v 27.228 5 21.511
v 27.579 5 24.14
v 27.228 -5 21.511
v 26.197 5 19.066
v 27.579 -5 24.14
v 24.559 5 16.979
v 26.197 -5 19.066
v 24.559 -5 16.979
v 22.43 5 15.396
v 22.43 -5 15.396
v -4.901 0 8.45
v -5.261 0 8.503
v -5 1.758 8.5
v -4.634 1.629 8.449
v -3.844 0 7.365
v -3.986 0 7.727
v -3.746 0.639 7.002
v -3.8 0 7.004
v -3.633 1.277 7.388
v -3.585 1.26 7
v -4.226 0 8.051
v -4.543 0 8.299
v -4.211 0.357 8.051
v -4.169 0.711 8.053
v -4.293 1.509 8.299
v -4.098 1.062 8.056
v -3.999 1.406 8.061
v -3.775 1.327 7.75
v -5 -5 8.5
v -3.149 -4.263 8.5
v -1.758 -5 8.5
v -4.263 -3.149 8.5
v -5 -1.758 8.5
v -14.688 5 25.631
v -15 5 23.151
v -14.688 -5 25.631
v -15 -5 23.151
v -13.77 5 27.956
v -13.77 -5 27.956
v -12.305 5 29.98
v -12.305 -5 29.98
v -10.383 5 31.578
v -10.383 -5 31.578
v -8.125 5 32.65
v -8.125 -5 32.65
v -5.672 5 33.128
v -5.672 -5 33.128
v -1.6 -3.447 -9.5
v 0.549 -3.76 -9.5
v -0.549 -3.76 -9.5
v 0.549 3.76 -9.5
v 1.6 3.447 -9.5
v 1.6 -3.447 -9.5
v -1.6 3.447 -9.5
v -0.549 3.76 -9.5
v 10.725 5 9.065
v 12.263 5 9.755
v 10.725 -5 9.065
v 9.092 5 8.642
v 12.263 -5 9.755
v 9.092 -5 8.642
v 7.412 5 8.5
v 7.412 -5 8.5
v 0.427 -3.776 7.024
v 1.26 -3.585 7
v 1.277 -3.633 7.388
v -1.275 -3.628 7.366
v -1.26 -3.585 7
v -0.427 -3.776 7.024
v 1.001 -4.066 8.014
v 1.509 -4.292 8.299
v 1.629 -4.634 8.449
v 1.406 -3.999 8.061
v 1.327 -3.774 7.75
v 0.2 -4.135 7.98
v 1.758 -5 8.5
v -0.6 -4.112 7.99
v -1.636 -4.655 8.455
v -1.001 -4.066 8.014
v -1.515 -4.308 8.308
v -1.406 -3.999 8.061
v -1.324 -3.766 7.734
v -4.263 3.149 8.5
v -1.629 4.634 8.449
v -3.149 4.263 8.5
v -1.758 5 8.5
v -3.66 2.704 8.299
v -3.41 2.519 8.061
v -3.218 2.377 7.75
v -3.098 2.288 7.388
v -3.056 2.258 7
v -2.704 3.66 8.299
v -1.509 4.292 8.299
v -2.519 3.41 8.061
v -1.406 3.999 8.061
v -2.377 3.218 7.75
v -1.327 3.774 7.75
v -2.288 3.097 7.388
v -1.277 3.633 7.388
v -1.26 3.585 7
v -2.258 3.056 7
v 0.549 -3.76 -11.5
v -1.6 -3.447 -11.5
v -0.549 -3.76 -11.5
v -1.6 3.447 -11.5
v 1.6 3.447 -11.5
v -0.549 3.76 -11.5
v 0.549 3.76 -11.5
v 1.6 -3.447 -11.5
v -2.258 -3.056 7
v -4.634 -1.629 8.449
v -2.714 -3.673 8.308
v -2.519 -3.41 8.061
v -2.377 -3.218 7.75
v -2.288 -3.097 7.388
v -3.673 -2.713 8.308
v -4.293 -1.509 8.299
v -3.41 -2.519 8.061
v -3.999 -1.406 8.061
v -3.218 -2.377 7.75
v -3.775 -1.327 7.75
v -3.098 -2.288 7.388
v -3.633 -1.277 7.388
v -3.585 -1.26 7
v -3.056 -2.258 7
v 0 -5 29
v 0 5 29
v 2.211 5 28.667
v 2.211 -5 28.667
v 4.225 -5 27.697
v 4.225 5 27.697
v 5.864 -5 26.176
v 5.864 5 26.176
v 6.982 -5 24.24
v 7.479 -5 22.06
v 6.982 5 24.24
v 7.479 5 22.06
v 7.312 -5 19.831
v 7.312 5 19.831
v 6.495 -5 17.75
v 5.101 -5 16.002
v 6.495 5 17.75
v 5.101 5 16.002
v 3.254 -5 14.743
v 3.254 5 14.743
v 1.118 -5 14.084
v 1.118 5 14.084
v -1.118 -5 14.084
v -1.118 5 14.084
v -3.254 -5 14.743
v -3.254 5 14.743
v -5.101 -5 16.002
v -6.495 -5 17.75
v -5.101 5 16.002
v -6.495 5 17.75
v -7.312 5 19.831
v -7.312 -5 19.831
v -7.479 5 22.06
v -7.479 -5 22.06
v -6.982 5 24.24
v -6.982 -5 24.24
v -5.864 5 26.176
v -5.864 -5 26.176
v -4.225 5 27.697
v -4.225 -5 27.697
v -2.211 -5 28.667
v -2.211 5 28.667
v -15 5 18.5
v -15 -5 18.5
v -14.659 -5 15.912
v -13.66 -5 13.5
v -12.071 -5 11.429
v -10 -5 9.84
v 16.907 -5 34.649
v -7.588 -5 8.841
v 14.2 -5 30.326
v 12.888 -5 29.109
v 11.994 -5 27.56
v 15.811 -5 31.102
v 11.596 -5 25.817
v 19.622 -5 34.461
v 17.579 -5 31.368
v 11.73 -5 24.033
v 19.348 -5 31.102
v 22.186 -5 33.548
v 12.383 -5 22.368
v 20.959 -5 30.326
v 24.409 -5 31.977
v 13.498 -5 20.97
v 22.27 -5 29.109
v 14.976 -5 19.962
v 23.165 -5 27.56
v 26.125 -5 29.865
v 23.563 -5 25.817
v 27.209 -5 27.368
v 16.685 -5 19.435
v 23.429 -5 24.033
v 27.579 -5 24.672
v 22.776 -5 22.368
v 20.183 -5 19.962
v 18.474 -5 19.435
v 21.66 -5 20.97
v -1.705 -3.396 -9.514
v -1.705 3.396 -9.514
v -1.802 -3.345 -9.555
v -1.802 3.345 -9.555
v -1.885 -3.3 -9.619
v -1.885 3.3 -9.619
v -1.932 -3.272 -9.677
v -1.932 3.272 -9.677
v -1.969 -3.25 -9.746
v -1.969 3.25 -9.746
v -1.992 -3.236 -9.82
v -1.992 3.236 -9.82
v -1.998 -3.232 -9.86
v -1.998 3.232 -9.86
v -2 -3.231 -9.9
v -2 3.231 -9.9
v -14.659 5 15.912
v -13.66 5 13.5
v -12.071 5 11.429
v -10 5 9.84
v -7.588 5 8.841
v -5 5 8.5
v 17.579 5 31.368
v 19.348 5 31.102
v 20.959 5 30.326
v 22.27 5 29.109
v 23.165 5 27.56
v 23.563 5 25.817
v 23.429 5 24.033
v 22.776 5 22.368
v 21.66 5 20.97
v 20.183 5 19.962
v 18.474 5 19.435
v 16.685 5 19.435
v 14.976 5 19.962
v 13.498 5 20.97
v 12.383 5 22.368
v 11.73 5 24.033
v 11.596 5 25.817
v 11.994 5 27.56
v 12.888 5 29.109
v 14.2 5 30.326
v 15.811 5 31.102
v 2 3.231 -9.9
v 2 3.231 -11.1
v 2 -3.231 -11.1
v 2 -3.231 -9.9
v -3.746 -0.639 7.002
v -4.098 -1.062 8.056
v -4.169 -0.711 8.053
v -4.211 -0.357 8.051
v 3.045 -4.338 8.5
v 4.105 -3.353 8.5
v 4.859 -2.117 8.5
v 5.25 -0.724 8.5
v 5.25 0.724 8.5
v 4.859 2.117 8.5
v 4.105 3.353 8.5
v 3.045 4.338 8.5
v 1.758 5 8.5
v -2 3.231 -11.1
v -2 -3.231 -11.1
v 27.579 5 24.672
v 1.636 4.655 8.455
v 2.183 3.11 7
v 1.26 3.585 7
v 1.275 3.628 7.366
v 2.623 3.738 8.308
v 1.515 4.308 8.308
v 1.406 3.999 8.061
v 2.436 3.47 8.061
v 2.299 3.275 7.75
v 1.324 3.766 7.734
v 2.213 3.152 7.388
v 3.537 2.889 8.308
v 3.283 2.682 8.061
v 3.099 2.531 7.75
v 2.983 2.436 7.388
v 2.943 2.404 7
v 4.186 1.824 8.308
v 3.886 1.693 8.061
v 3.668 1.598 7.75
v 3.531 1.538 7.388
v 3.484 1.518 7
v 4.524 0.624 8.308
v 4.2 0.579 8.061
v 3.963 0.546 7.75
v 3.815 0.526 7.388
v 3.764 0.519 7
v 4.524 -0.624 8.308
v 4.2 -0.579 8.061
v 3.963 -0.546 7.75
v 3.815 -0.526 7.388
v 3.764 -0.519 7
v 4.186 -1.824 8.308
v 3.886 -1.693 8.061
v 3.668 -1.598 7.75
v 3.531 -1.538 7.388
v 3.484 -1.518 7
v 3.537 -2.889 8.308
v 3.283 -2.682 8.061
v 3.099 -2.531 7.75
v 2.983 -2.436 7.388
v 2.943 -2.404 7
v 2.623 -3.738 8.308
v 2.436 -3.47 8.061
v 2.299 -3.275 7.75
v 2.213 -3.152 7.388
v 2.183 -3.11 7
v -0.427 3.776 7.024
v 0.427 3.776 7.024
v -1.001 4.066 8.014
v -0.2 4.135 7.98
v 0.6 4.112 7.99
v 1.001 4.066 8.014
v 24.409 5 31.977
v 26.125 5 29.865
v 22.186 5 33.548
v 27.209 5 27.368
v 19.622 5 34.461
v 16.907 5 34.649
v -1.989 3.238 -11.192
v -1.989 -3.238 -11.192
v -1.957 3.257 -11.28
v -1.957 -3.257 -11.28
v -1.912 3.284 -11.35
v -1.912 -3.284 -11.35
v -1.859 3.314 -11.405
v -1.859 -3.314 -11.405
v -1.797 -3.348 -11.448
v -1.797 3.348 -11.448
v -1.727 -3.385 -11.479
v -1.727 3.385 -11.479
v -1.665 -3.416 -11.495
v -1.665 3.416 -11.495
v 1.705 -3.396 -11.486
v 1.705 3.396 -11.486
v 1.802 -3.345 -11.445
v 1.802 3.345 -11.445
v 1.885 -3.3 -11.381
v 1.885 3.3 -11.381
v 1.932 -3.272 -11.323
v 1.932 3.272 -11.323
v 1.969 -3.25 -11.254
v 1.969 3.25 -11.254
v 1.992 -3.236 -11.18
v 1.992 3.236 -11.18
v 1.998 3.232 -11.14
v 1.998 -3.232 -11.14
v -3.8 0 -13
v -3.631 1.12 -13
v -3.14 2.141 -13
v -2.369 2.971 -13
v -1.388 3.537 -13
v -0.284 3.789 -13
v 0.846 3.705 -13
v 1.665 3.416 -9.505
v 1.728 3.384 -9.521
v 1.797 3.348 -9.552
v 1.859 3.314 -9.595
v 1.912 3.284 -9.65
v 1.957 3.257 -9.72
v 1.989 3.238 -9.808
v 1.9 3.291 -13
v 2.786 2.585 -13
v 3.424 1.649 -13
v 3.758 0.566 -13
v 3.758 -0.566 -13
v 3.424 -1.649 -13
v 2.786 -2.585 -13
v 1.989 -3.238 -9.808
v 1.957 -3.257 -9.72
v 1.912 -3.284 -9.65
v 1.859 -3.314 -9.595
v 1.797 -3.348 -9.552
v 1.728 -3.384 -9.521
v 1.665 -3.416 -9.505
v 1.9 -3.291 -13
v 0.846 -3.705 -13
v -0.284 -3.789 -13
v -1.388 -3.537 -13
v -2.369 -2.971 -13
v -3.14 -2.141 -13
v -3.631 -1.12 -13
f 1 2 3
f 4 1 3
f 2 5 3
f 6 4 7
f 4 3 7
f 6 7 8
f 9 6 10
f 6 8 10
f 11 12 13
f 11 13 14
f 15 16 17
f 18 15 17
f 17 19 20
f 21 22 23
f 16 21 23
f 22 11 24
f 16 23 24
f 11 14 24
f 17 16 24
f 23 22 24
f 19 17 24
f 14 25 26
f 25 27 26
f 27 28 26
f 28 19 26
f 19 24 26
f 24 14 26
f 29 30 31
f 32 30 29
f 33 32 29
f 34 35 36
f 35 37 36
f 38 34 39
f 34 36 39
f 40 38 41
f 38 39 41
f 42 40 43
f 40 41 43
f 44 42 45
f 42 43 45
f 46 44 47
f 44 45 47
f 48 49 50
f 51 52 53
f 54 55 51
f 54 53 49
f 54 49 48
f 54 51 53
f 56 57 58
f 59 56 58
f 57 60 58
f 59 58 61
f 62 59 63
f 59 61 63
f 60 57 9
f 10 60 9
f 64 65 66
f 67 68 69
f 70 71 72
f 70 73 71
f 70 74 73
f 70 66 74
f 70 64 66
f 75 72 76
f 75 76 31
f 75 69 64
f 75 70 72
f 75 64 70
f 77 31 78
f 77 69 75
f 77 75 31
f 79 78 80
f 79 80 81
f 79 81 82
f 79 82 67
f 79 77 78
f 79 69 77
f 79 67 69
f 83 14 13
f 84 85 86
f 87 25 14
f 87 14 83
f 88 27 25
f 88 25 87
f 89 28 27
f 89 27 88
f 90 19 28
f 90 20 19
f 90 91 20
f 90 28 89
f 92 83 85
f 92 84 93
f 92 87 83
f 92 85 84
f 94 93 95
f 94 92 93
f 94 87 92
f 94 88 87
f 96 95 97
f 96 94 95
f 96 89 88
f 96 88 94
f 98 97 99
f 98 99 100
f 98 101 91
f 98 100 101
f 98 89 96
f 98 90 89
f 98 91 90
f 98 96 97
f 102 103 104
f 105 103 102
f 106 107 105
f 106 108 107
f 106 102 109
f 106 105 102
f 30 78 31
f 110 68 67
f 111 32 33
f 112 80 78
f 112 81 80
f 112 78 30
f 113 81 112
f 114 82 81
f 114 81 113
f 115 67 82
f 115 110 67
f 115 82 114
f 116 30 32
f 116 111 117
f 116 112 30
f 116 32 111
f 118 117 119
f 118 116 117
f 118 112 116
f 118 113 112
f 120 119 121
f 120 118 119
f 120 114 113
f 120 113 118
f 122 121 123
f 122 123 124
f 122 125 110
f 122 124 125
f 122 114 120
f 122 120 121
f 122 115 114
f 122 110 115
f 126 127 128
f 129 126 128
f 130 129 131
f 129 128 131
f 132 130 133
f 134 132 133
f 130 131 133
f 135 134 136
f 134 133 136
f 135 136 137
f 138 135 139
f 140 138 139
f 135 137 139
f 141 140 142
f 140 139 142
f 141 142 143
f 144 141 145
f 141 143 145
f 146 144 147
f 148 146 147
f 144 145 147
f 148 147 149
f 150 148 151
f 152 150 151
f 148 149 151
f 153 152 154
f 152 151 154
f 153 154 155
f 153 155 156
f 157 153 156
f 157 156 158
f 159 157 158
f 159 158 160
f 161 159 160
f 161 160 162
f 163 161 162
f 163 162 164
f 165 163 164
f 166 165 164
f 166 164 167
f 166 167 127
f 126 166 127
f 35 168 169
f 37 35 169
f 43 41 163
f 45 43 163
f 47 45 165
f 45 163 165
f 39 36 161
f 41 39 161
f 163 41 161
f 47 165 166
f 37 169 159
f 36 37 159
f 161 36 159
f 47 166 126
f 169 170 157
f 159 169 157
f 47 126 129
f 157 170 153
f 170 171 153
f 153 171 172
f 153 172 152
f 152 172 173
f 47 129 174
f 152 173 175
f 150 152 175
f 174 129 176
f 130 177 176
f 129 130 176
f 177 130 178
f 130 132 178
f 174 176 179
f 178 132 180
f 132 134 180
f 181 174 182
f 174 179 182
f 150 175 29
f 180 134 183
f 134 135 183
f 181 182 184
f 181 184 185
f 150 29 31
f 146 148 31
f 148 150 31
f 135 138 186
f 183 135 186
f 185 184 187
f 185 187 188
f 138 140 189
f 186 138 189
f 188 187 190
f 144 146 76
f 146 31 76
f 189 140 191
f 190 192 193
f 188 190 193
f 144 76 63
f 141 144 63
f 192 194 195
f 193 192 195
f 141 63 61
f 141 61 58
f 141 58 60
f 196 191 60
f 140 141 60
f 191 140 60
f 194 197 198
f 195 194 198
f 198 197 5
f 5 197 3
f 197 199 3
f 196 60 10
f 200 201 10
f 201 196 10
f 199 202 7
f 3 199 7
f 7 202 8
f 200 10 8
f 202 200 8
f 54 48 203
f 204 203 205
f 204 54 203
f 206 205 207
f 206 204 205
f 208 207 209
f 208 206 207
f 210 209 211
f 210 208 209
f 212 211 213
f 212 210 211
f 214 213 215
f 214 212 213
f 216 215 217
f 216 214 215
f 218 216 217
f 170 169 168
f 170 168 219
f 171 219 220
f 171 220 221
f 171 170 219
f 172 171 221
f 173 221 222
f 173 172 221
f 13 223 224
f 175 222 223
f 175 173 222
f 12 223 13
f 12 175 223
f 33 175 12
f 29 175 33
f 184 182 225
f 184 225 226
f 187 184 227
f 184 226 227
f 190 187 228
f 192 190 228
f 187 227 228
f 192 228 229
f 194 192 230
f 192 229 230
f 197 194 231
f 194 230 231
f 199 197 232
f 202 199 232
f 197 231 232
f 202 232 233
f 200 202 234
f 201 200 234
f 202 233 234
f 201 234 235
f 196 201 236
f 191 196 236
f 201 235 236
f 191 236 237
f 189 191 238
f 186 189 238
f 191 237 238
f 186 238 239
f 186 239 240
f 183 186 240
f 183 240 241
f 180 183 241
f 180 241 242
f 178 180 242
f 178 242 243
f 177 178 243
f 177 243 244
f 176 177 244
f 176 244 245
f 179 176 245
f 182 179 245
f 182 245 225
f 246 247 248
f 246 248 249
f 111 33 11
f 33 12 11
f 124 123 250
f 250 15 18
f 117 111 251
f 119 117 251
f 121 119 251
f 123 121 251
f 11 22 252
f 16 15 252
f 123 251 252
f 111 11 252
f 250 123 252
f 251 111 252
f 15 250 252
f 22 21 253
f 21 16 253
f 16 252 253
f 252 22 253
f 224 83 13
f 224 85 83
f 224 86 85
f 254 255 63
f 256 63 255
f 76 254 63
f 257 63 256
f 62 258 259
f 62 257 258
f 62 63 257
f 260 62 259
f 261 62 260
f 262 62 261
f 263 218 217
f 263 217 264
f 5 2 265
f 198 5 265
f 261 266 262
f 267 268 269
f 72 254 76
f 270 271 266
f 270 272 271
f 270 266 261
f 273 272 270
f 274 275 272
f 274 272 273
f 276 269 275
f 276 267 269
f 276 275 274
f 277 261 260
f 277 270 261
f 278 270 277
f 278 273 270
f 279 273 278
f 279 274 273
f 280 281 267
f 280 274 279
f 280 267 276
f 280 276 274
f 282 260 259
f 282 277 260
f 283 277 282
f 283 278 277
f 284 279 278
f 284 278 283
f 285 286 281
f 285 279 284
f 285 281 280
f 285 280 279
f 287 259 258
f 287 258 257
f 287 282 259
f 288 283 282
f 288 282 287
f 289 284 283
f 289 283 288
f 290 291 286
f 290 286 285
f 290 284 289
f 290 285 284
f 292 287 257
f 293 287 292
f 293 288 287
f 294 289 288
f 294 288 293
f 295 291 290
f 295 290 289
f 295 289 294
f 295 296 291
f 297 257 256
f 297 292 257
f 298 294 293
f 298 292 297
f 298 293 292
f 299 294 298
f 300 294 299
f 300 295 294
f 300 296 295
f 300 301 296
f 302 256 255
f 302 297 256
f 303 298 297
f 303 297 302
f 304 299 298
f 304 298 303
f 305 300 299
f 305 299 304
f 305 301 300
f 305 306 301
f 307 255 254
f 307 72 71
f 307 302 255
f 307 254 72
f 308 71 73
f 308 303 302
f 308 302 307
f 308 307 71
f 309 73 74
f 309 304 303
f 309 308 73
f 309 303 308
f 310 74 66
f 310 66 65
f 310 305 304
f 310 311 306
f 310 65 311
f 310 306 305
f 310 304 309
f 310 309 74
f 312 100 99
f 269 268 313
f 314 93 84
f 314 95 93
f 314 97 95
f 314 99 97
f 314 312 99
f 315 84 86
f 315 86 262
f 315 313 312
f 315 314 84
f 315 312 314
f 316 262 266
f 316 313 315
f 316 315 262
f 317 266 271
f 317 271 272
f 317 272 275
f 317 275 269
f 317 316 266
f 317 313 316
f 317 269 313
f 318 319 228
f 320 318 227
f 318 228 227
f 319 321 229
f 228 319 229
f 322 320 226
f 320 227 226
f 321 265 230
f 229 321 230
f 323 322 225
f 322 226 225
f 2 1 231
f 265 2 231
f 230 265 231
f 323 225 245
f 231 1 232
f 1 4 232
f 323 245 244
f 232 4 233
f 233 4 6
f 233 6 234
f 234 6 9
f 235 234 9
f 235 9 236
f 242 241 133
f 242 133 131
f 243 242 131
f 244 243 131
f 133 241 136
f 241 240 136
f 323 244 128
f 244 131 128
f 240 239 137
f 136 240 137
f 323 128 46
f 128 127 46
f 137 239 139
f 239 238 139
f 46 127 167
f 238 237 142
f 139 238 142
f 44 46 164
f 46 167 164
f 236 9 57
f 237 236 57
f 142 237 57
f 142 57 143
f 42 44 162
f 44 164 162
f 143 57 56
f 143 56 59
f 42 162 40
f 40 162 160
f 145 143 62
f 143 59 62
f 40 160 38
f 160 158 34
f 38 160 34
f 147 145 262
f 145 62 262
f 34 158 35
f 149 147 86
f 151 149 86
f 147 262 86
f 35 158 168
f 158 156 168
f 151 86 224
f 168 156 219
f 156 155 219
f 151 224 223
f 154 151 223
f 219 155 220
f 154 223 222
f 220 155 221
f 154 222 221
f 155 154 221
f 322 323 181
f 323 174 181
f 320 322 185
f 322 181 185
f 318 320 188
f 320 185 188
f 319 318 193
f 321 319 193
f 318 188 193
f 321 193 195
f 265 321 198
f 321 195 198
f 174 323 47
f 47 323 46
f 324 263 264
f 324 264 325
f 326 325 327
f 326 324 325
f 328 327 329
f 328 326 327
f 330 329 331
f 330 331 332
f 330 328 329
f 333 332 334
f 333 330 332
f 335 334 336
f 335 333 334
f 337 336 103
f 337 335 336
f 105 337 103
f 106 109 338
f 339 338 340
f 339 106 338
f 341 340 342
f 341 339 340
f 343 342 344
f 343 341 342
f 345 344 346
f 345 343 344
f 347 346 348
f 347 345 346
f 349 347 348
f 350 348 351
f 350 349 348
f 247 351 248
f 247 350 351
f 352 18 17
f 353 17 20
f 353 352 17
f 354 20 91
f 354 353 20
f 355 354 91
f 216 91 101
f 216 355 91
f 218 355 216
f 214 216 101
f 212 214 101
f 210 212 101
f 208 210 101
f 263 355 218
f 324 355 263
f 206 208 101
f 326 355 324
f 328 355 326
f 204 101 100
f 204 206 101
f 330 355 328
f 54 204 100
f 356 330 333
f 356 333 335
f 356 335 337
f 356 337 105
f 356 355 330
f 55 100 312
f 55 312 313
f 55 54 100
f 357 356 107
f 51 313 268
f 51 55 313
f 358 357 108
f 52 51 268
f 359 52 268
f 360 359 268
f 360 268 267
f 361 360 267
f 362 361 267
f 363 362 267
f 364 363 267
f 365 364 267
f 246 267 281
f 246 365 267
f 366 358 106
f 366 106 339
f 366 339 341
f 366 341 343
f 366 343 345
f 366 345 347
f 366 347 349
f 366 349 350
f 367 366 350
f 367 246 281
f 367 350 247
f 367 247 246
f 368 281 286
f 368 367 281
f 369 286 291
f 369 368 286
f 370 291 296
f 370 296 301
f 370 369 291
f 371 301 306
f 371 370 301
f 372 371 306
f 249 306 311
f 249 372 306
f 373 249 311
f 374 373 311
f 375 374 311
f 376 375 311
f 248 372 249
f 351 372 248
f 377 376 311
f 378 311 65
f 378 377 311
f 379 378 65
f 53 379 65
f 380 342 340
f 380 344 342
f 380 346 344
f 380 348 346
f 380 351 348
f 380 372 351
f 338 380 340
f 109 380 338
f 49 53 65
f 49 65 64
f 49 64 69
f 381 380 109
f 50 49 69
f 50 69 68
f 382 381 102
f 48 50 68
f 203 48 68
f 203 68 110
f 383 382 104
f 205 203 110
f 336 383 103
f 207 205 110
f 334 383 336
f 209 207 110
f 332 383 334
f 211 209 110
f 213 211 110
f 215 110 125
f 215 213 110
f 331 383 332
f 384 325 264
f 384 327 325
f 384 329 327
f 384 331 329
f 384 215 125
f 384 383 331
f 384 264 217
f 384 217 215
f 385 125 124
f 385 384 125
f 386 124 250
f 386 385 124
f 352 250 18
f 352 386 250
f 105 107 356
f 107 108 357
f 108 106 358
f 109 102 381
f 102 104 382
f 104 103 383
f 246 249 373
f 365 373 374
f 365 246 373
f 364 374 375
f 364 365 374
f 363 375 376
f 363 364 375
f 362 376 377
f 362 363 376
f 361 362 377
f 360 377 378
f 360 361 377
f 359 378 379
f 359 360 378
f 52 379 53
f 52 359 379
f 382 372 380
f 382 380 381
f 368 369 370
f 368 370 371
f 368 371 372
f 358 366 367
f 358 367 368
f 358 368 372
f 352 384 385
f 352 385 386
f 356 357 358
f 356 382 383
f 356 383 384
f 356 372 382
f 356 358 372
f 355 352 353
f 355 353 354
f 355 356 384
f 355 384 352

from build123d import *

# Parameters (mm, degrees)
SKETCH1_R           = 5
BOSS_EXTRUDE1_DEPTH = 20
SKETCH2_R           = 5
SKETCH2_R_2         = 3.98
CUT_EXTRUDE2_DEPTH  = 8
SKETCH8_R           = 5
BOSS_EXTRUDE2_DEPTH = 20
BOSS_EXTRUDE3_START = -31.5
BOSS_EXTRUDE3_DEPTH = 31.5
BOSS_EXTRUDE4_START = -31.5
BOSS_EXTRUDE4_DEPTH = 31.5
SKETCH12_R          = 7.5
SKETCH12_R_2        = 6
CUT_EXTRUDE3_DEPTH  = 31.5
CUT_EXTRUDE4_DEPTH  = 55.083269132
FILLET1_R           = 10
BOSS_EXTRUDE5_START = 13
SKETCH17_R          = 3.98
BOSS_EXTRUDE5_DEPTH = 13
CUT_EXTRUDE5_DEPTH  = 46.417762115
SKETCH19_R          = 5
SKETCH19_R_2        = 3.98
CUT_EXTRUDE6_DEPTH  = 0.5
SKETCH20_R          = 3.98
SKETCH20_R_2        = 3.8
CUT_EXTRUDE7_DEPTH  = 21.5
FILLET2_R           = 1.5


with BuildPart() as part:
    # Sketch1 → Boss-Extrude1 (new body)
    with BuildSketch(Plane.XY):
        Circle(SKETCH1_R)
    extrude(amount=BOSS_EXTRUDE1_DEPTH)

    # Sketch2 → Cut-Extrude2 (cut)
    with BuildSketch(Plane(origin=(0, 0, 0), x_dir=(-1, 0, 0), z_dir=(0, 0, -1))):
        Circle(SKETCH2_R)
        Circle(SKETCH2_R_2, mode=Mode.SUBTRACT)
    extrude(amount=-CUT_EXTRUDE2_DEPTH, mode=Mode.SUBTRACT)

    # Sketch8 → Boss-Extrude2 (add)
    with BuildSketch(Plane.XY.offset(20)):
        with Locations(Location((0, 0, 0), (0, 0, 180))):
            Circle(SKETCH8_R)
    extrude(amount=BOSS_EXTRUDE2_DEPTH)

    # Sketch9 → Boss-Extrude3 (add)
    with BuildSketch(Plane.XY.offset(40).offset(BOSS_EXTRUDE3_START)):
        with BuildLine():
            Line((0, 5), (35, 5))
            Line((35, 5), (35, -5))
            Line((35, -5), (0, -5))
            ThreePointArc((0, -5), (5, 0), (0, 5))
        make_face()
    extrude(amount=BOSS_EXTRUDE3_DEPTH)

    # Sketch10 → Boss-Extrude4 (add)
    with BuildSketch(Plane.XY.offset(40).offset(BOSS_EXTRUDE4_START)):
        with BuildLine():
            ThreePointArc((0, -5), (-5, 0), (0, 5))
            Line((0, 5), (-15, 5))
            Line((-15, 5), (-15, -5))
            Line((-15, -5), (0, -5))
        make_face()
    extrude(amount=BOSS_EXTRUDE4_DEPTH)

    # Sketch12 → Cut-Extrude3 (cut)
    with BuildSketch(Plane(origin=(0, 5, 0), x_dir=(1, 0, 0), z_dir=(0, 1, 0))):
        with Locations(Location((0, -21.5, 0), (0, 0, 270))):
            Circle(SKETCH12_R)
        with Locations(Location((17.579426131, -25.368304137, 0), (0, 0, 270))):
            Circle(SKETCH12_R_2)
    extrude(amount=-CUT_EXTRUDE3_DEPTH, mode=Mode.SUBTRACT)

    # Sketch14 → Cut-Extrude4 (cut, through all)
    with BuildSketch(Plane(origin=(0, 5, 0), x_dir=(1, 0, 0), z_dir=(0, 1, 0))):
        Polygon((-15, -40), (35, -40), (35, -37.368304137), (35, -8.5), (10, -8.5), (27.579426131, -18.251873125), (27.579426131, -35.368304137), (-15, -32.5), align=None)
    extrude(amount=-CUT_EXTRUDE4_DEPTH, mode=Mode.SUBTRACT)

    # Fillet1
    fillet1_edges = [part.edges().sort_by_distance(p)[0] for p in [
        (-15, 0, 8.5),
        (27.579426131, 0, 18.251873125),
        (10, 0, 8.5),
        (-15, 0, 32.5),
        (27.579426131, 0, 35.368304137),
    ]]
    fillet(fillet1_edges, radius=FILLET1_R - 0.0001)  # a hair under: the kernel refuses the full size

    # Sketch17 → Boss-Extrude5 (add)
    with BuildSketch(Plane(origin=(0, 0, 0), x_dir=(-1, 0, 0), z_dir=(0, 0, -1)).offset(BOSS_EXTRUDE5_START)):
        Circle(SKETCH17_R)
    extrude(amount=-BOSS_EXTRUDE5_DEPTH)

    # Sketch18 → Cut-Extrude5 (cut, through all)
    with BuildSketch(Plane(origin=(0, 5, 0), x_dir=(1, 0, 0), z_dir=(0, 1, 0))):
        with BuildLine():
            Line((-1.6, 11.5), (1.6, 11.5))
            ThreePointArc((1.6, 11.5), (1.882842712, 11.382842712), (2, 11.1))
            Line((2, 11.1), (2, 9.9))
            ThreePointArc((2, 9.9), (1.882842712, 9.617157288), (1.6, 9.5))
            Line((1.6, 9.5), (-1.6, 9.5))
            ThreePointArc((-1.6, 9.5), (-1.882842712, 9.617157288), (-2, 9.9))
            Line((-2, 9.9), (-2, 11.1))
            ThreePointArc((-2, 11.1), (-1.882842712, 11.382842712), (-1.6, 11.5))
        make_face()
    extrude(amount=-CUT_EXTRUDE5_DEPTH, mode=Mode.SUBTRACT)

    # Sketch19 → Cut-Extrude6 (cut)
    with BuildSketch(Plane(origin=(0, 0, 8), x_dir=(-1, 0, 0), z_dir=(0, 0, -1))):
        Circle(SKETCH19_R)
        Circle(SKETCH19_R_2, mode=Mode.SUBTRACT)
    extrude(amount=-CUT_EXTRUDE6_DEPTH, mode=Mode.SUBTRACT)

    # Sketch20 → Cut-Extrude7 (cut)
    with BuildSketch(Plane(origin=(0, 0, -13), x_dir=(-1, 0, 0), z_dir=(0, 0, -1))):
        Circle(SKETCH20_R)
        Circle(SKETCH20_R_2, mode=Mode.SUBTRACT)
    extrude(amount=-CUT_EXTRUDE7_DEPTH, mode=Mode.SUBTRACT)

    # Fillet2
    fillet2_edges = [part.edges().sort_by_distance(p)[0] for p in [
        (3.8, 0, 8.5),
    ]]
    fillet(fillet2_edges, radius=FILLET2_R)


solid = part.part
